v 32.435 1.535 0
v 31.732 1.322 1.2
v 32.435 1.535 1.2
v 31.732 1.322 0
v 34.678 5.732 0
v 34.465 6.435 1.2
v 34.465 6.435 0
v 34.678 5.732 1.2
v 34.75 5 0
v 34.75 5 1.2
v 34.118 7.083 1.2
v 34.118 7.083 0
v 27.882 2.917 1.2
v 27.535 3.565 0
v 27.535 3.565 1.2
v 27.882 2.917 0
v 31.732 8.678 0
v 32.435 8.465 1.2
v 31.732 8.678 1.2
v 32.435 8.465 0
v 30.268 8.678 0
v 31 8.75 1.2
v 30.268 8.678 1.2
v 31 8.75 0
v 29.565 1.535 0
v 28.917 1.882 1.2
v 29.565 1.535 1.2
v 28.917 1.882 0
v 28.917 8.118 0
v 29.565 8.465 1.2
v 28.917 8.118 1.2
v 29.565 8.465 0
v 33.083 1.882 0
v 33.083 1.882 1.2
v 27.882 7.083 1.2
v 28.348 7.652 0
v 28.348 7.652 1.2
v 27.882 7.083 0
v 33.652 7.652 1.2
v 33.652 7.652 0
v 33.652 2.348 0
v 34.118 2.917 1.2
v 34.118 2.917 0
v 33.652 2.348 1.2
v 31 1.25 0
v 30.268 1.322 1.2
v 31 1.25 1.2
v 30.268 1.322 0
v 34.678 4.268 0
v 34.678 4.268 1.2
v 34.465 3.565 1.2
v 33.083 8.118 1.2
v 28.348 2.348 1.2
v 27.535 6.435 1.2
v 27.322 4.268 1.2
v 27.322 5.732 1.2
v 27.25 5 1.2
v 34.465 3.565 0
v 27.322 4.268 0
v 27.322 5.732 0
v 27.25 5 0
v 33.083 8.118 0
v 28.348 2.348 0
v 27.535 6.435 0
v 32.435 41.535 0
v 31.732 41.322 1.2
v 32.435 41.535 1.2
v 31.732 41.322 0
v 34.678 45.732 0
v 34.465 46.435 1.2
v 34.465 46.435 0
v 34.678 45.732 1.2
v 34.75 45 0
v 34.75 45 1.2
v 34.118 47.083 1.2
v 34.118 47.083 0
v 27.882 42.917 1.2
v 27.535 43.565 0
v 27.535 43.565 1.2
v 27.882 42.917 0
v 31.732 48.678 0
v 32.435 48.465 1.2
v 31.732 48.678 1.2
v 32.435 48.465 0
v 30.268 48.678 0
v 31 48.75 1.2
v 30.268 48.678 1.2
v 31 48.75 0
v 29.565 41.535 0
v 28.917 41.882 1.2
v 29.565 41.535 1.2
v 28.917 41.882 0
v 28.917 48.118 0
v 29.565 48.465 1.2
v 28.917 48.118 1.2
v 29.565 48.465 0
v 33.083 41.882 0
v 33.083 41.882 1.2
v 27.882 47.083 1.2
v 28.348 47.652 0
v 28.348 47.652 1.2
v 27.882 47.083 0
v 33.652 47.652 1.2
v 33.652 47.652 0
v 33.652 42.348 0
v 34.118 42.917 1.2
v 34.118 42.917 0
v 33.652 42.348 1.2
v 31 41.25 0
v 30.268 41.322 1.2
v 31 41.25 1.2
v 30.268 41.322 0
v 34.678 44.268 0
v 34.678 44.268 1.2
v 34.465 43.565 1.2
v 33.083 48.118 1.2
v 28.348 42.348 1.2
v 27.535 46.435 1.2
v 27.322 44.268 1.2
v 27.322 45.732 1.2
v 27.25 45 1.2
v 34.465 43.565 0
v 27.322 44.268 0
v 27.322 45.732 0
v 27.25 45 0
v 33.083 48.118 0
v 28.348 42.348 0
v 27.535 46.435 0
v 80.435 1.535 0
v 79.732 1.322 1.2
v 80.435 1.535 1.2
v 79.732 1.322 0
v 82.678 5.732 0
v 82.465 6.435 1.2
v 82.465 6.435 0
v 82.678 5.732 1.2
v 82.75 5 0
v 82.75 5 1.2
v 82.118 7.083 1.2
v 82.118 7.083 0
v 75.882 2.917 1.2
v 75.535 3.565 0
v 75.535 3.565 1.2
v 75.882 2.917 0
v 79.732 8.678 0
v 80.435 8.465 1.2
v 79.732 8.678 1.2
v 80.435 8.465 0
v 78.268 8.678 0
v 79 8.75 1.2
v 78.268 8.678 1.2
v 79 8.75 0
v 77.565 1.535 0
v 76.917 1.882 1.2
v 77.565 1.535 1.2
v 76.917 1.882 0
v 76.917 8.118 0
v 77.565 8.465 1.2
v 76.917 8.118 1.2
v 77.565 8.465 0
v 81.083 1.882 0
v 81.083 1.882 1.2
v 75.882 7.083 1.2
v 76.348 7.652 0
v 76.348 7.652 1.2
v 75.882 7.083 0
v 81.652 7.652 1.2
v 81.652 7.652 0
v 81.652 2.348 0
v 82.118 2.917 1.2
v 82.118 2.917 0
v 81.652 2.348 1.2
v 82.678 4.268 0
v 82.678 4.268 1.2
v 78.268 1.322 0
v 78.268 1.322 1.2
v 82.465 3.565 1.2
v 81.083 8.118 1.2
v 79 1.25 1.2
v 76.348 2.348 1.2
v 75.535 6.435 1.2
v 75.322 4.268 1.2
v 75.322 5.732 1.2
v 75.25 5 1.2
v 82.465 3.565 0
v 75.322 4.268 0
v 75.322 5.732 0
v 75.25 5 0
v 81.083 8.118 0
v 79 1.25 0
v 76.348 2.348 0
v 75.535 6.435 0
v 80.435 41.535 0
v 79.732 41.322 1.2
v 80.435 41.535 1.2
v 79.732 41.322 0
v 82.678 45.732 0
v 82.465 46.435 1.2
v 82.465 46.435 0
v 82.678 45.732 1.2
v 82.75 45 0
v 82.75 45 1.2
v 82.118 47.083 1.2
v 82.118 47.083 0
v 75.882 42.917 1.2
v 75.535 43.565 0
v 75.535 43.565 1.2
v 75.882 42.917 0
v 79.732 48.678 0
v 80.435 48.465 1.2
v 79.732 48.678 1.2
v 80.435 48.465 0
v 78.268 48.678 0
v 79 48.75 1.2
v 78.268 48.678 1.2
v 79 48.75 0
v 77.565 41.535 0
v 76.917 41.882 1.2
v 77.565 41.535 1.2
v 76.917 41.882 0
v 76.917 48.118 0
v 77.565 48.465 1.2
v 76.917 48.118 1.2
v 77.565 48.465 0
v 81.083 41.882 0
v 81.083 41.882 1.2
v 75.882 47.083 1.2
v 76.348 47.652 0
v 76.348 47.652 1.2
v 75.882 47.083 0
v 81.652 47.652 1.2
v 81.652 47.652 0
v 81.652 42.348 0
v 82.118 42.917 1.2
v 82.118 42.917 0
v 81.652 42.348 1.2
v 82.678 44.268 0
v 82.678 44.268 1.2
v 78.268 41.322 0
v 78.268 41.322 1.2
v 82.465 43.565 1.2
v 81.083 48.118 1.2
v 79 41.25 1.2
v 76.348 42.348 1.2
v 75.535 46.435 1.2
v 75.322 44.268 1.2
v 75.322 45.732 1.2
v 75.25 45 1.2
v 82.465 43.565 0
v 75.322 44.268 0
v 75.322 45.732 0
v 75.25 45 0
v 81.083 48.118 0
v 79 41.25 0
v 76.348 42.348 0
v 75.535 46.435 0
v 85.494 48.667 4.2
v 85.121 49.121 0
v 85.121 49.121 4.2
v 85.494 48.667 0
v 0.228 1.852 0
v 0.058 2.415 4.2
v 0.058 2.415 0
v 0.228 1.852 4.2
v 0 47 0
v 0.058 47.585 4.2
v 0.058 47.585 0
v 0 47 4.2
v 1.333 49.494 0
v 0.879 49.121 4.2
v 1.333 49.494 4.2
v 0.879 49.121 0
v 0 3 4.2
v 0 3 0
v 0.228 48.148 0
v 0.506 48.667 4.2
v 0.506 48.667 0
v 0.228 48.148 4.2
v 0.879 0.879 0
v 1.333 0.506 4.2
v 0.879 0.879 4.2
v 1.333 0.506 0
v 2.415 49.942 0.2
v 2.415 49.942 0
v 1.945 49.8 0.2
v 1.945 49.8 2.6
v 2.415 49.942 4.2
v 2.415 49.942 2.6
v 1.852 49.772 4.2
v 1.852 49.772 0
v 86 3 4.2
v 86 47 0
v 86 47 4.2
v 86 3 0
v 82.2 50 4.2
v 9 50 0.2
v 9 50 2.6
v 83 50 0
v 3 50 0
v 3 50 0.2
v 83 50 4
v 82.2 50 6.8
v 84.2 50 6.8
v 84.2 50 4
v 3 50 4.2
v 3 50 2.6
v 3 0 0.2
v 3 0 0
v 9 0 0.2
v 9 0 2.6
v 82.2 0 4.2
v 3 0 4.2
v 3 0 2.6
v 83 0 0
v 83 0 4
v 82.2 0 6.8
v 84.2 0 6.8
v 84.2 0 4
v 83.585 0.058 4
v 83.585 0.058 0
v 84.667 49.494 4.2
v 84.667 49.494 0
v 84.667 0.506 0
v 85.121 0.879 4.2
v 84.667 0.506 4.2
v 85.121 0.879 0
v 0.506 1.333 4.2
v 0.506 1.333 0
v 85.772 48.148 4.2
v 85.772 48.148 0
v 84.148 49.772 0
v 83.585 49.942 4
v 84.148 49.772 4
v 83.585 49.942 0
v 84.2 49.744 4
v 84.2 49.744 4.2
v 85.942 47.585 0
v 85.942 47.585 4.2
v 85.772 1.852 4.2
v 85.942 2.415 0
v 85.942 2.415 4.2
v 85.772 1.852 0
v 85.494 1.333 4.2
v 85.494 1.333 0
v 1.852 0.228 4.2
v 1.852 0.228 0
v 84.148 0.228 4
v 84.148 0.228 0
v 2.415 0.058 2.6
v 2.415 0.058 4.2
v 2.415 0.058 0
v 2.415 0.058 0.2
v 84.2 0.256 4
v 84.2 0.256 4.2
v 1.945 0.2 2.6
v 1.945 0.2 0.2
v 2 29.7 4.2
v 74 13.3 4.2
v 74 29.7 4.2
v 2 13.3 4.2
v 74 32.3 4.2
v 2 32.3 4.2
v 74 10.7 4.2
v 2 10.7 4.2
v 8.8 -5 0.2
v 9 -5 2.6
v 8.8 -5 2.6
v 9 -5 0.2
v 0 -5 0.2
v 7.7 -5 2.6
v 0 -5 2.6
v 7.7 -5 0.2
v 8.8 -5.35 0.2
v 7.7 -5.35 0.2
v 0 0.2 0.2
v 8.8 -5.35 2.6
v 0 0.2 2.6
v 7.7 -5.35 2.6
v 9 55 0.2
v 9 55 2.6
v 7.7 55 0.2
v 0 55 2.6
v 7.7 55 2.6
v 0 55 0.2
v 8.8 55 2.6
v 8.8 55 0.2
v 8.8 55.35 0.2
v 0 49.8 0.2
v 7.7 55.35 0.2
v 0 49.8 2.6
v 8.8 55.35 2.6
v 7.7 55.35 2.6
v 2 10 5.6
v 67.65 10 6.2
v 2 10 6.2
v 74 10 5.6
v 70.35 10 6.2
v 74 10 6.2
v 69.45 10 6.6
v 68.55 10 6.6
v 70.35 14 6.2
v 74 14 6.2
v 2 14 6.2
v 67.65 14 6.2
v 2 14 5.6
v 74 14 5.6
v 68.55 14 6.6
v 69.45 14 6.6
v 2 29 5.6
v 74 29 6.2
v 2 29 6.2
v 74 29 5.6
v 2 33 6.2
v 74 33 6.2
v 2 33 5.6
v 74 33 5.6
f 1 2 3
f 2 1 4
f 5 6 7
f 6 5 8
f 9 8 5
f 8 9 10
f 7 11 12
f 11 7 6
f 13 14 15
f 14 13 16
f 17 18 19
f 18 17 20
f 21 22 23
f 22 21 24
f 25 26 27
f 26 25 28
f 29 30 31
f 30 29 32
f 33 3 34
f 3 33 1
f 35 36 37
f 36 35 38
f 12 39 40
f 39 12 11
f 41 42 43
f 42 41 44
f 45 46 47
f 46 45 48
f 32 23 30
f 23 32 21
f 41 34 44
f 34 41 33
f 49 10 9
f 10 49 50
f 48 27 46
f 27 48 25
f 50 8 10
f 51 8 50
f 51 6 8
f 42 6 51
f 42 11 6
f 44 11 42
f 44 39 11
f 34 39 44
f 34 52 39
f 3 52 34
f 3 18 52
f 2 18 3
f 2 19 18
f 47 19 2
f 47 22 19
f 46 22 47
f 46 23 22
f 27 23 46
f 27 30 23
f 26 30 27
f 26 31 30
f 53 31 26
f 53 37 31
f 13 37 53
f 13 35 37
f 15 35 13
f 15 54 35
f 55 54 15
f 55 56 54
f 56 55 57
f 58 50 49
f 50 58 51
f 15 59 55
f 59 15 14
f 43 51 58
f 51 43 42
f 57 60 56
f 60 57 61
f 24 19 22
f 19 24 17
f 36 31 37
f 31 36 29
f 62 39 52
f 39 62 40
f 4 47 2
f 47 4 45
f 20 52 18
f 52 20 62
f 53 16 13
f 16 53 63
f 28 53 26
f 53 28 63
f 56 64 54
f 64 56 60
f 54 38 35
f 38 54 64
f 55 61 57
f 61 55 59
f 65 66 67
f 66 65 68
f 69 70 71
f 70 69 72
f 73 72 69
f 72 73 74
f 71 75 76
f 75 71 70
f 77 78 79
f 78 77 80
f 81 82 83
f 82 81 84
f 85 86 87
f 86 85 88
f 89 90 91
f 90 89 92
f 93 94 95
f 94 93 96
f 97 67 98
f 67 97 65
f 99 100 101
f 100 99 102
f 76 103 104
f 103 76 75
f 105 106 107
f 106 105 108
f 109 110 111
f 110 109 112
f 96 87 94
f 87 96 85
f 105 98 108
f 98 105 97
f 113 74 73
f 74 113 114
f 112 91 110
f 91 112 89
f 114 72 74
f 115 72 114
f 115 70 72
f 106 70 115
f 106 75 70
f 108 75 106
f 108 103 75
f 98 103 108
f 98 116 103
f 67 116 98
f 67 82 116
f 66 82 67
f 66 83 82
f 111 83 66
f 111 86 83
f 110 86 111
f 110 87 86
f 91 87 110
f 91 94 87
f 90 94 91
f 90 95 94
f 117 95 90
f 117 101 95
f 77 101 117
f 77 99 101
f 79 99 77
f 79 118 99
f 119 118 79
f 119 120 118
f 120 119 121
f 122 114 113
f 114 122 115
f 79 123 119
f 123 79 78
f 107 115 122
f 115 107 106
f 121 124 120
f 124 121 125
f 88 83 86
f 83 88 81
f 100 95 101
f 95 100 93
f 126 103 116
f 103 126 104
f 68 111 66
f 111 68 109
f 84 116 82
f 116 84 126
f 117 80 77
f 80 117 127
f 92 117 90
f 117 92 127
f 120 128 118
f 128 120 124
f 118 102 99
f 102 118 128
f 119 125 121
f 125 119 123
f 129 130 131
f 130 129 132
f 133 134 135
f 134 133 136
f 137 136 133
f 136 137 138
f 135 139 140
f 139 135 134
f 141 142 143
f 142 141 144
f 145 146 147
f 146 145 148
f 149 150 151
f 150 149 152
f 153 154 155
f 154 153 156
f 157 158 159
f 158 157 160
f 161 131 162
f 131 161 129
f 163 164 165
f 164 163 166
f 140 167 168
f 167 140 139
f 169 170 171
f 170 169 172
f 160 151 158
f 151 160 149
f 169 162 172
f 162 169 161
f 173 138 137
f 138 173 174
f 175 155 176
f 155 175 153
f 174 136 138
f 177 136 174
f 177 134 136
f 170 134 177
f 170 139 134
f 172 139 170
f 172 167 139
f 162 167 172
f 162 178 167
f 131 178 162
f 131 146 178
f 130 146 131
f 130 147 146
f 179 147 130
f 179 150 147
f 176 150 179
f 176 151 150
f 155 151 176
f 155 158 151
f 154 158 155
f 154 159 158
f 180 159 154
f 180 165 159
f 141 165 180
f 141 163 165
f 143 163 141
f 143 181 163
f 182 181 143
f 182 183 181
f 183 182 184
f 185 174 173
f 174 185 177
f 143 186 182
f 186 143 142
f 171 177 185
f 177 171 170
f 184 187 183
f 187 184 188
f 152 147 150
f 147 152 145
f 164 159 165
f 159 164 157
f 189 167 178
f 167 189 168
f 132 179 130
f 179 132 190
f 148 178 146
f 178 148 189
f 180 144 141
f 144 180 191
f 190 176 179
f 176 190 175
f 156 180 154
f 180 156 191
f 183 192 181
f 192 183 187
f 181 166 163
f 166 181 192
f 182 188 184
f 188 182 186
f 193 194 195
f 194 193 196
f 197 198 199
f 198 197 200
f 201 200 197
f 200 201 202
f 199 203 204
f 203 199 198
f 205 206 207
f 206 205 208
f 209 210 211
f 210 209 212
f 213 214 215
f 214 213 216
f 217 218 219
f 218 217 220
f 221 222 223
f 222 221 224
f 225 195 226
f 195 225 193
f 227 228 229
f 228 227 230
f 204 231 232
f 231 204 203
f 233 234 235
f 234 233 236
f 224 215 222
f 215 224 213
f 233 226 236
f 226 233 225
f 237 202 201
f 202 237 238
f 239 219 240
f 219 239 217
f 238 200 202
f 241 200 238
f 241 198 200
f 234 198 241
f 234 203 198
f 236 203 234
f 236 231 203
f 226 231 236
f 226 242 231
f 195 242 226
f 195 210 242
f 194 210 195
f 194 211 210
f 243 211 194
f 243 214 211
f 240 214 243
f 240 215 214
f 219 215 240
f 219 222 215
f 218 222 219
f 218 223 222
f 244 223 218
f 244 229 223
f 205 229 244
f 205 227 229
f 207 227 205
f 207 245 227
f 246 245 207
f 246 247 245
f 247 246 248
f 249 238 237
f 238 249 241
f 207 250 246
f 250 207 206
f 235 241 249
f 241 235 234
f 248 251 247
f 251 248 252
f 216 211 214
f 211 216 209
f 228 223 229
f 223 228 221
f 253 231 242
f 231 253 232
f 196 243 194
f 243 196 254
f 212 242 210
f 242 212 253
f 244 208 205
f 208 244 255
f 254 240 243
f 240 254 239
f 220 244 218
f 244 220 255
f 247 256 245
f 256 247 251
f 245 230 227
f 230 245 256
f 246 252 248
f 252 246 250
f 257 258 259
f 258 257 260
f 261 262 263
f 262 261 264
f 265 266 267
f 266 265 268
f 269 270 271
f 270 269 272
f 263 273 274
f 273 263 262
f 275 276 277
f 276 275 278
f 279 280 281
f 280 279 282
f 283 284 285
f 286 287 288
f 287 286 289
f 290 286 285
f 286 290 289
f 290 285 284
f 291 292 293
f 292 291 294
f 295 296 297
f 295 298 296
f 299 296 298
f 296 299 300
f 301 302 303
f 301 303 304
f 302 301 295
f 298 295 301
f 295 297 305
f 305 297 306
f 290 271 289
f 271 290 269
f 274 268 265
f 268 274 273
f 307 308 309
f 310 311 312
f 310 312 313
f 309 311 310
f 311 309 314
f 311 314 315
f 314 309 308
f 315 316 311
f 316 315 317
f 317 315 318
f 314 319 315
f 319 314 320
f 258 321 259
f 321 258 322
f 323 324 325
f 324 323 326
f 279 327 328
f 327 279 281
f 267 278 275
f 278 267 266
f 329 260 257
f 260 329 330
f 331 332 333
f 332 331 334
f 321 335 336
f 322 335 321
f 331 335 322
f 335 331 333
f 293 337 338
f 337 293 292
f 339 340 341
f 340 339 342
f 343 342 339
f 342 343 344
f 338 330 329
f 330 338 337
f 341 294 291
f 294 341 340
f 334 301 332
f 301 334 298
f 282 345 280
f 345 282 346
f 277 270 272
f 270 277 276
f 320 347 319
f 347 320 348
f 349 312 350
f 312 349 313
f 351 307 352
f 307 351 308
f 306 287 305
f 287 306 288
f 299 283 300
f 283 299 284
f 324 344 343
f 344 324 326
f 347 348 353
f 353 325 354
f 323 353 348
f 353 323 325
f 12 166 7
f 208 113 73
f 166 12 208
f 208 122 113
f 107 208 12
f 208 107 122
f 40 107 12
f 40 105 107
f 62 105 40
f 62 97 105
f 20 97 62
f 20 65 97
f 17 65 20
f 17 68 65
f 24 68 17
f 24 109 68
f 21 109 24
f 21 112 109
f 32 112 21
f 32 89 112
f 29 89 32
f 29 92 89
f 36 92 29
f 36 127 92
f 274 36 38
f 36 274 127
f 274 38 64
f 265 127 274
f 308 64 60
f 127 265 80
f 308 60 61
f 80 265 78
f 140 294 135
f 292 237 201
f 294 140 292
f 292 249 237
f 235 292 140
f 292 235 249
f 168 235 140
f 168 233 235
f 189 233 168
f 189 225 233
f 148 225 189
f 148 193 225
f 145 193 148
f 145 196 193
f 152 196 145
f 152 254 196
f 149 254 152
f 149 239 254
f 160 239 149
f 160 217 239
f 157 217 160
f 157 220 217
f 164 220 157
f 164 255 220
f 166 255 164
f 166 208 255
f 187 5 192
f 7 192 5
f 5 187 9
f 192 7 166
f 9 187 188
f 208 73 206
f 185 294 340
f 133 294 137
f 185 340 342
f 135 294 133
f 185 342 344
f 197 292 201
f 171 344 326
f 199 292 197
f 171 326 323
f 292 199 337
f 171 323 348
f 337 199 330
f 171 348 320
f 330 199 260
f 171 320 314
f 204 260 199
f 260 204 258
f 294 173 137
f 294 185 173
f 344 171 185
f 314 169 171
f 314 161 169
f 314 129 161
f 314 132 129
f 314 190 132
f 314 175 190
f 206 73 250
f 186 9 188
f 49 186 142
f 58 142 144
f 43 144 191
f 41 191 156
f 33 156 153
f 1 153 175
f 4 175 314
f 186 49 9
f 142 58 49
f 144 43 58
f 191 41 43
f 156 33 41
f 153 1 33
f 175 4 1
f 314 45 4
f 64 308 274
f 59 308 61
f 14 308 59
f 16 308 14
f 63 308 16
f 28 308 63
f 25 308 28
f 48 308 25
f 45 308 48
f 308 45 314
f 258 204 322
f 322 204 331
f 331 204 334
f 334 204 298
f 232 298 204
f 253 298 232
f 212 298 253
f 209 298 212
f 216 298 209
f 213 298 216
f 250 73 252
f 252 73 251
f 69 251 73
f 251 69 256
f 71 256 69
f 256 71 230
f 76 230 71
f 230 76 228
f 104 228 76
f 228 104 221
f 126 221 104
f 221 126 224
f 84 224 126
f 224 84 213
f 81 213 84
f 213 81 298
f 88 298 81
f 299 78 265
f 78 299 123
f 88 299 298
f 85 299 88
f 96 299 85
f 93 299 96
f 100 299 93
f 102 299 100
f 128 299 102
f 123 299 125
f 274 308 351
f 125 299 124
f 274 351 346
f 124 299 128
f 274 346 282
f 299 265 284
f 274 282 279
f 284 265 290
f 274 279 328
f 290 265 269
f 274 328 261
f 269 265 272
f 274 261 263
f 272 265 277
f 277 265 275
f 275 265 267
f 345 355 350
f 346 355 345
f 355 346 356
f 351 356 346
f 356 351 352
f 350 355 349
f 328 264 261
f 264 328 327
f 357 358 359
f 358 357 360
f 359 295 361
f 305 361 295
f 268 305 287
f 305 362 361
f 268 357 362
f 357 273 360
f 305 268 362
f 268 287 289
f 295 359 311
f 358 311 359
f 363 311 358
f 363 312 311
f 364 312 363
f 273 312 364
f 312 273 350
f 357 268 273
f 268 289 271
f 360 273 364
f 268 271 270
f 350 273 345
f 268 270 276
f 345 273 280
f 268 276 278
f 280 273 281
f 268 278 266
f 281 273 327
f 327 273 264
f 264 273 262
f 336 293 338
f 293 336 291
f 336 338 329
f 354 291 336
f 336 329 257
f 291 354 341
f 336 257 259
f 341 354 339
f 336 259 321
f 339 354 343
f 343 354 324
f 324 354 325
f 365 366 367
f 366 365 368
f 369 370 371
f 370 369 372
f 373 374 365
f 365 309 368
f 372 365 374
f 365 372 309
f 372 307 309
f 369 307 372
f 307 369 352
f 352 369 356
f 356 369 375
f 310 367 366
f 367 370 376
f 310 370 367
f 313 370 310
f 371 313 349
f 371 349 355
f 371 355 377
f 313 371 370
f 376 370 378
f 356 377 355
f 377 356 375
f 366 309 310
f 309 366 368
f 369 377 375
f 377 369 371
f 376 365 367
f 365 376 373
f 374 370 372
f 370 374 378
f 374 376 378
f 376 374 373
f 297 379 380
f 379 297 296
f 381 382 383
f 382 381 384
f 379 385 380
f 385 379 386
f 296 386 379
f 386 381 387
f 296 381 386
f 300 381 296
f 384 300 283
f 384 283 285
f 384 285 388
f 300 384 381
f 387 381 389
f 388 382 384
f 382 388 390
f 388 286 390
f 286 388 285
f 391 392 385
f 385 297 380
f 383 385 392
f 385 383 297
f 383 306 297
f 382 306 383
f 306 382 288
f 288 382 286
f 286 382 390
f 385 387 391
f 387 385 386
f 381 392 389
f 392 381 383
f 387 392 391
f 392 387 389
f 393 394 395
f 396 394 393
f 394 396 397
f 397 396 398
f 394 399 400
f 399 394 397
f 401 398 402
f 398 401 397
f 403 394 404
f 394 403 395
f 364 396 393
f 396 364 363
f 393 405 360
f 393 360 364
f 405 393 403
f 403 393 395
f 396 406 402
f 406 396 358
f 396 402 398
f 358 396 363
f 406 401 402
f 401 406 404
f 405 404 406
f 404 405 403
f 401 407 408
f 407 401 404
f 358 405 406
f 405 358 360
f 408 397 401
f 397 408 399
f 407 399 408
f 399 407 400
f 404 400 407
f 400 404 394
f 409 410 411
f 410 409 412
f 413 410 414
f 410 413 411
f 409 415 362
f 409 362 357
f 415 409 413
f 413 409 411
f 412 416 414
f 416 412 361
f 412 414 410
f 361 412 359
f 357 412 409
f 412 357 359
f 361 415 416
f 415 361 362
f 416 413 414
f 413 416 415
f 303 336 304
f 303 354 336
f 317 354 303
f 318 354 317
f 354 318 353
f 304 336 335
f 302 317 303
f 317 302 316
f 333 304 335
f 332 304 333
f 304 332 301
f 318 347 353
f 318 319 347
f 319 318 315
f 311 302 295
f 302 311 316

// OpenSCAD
include <../matrixportal/matrixportal_s3_mount.scad>;

// Fixed side-mounted dock. The two keyed tabs snap into the MatrixPortal left
// side; rear boss sockets are passive anti-flex pads only. The carrier still
// slides in from the left and clicks into the dovetail detent.
matrixportal_s3_dock_print();
